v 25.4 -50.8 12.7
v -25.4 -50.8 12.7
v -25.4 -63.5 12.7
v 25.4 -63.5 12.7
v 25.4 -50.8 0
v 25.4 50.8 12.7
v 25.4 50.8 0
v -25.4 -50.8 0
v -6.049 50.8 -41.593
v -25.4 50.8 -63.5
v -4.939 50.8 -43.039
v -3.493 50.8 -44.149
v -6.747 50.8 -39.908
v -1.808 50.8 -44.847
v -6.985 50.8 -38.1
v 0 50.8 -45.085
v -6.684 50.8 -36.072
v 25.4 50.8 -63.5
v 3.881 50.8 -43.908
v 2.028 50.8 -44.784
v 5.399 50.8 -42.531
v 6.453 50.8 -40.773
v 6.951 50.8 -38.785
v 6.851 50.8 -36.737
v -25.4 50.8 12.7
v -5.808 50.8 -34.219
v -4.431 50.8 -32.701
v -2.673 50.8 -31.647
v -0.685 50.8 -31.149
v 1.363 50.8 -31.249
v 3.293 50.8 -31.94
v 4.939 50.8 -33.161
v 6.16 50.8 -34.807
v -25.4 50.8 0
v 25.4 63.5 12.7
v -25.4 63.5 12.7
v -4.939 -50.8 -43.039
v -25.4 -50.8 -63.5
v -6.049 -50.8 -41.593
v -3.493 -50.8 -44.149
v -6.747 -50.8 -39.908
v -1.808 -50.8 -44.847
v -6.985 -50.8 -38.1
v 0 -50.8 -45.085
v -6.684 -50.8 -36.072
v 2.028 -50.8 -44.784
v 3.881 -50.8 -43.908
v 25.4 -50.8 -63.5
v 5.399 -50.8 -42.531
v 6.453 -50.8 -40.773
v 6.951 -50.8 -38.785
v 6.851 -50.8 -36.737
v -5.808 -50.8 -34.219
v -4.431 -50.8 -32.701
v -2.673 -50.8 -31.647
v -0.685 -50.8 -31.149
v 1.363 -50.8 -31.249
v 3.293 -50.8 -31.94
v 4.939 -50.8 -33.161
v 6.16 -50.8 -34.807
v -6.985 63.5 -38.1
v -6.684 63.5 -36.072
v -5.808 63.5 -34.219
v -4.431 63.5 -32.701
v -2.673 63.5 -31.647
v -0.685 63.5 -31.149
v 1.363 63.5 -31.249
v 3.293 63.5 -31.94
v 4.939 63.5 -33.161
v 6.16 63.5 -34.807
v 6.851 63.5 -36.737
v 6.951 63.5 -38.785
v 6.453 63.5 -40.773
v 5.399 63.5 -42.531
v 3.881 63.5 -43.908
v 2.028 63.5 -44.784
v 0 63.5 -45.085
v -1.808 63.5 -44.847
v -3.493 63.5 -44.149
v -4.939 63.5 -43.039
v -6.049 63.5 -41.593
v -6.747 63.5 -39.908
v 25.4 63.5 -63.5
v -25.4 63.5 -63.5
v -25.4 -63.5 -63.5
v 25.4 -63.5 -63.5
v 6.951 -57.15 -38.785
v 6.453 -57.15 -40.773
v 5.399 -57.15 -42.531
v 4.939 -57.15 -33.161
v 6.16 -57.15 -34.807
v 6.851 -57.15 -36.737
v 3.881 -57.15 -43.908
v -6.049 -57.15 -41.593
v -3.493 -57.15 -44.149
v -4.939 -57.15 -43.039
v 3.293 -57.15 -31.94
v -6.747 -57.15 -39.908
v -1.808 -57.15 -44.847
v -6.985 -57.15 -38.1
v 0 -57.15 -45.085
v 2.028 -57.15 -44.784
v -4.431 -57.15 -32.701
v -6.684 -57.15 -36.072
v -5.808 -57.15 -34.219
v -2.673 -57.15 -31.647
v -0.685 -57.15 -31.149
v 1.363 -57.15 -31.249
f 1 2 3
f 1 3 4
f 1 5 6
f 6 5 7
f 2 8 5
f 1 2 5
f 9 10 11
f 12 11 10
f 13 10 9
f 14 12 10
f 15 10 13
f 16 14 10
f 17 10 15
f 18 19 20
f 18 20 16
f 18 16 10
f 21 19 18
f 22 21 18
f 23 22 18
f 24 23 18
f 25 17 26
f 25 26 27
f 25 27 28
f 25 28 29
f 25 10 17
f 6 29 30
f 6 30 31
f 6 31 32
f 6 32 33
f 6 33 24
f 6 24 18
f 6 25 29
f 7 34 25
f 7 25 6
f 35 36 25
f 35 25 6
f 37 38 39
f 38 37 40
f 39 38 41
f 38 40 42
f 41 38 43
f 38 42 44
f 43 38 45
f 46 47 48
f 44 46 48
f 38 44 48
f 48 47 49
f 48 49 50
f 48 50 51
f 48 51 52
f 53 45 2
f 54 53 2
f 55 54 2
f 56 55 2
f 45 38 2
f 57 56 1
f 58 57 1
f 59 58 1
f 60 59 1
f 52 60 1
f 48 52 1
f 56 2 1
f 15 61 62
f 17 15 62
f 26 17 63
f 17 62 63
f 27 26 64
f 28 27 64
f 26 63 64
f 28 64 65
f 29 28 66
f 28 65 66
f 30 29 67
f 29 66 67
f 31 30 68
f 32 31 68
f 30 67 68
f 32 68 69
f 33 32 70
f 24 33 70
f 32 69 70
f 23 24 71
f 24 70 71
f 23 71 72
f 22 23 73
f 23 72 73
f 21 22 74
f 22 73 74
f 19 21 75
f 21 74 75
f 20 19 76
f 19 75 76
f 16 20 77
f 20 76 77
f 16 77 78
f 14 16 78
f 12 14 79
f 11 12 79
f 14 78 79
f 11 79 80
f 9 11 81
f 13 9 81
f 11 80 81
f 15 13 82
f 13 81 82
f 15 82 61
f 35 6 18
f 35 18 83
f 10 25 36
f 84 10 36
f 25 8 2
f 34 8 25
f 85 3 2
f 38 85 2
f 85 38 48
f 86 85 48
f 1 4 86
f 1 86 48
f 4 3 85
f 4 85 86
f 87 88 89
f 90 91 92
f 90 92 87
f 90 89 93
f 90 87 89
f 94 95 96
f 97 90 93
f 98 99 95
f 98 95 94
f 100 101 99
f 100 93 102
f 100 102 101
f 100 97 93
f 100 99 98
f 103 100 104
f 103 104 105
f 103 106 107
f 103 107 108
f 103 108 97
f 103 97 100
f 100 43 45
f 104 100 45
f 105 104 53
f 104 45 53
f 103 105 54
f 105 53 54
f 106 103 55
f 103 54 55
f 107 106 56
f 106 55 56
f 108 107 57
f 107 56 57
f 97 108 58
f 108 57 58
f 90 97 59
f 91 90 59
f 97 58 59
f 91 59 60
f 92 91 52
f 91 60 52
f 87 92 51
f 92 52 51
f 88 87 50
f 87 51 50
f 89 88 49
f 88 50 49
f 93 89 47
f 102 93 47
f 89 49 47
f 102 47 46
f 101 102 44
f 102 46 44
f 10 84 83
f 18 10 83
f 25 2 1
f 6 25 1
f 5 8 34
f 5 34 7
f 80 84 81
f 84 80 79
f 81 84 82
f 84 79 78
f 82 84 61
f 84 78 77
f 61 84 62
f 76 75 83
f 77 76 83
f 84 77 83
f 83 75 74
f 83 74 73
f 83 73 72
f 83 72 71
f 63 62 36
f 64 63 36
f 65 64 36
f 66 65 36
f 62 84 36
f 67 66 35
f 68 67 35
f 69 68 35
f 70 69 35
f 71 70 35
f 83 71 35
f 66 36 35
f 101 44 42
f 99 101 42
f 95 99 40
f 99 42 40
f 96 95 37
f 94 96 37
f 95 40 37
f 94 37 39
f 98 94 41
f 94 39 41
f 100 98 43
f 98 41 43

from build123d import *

# Parameters (mm, degrees)
F0_W     = 50.8
F0_H     = 101.6
F1_DEPTH = 12.7
F2_W     = 50.8
F2_H     = 12.7
F3_DEPTH = 76.2
F5_DEPTH = 120.65


with BuildPart() as f1:
    # F0 (on Top) → F1 (new body)
    with BuildSketch(Plane.XY):
        Rectangle(F0_W, F0_H)
    extrude(amount=F1_DEPTH)


with BuildPart() as f3:
    # F2 (on face) → F3 (new body)
    with BuildSketch(Plane.XY.offset(12.7)):
        with Locations((0, 57.15)):
            Rectangle(F2_W, F2_H)
        with Locations((0, -57.15)):
            Rectangle(F2_W, F2_H)
    extrude(amount=-F3_DEPTH)

    # F4 (on face) → F5 (cut)
    with BuildSketch(Plane(origin=(0, 63.5, 0), x_dir=(-1, 0, 0), z_dir=(0, 1, 0))):
        with BuildLine():
            ThreePointArc((0, -45.085), (4.939141, -43.039141), (6.985, -38.1))
            ThreePointArc((6.985, -38.1), (-4.939141, -33.160859), (0, -45.085))
        make_face()
    extrude(amount=-F5_DEPTH, mode=Mode.SUBTRACT)


solid = Compound([f1.part, f3.part])
